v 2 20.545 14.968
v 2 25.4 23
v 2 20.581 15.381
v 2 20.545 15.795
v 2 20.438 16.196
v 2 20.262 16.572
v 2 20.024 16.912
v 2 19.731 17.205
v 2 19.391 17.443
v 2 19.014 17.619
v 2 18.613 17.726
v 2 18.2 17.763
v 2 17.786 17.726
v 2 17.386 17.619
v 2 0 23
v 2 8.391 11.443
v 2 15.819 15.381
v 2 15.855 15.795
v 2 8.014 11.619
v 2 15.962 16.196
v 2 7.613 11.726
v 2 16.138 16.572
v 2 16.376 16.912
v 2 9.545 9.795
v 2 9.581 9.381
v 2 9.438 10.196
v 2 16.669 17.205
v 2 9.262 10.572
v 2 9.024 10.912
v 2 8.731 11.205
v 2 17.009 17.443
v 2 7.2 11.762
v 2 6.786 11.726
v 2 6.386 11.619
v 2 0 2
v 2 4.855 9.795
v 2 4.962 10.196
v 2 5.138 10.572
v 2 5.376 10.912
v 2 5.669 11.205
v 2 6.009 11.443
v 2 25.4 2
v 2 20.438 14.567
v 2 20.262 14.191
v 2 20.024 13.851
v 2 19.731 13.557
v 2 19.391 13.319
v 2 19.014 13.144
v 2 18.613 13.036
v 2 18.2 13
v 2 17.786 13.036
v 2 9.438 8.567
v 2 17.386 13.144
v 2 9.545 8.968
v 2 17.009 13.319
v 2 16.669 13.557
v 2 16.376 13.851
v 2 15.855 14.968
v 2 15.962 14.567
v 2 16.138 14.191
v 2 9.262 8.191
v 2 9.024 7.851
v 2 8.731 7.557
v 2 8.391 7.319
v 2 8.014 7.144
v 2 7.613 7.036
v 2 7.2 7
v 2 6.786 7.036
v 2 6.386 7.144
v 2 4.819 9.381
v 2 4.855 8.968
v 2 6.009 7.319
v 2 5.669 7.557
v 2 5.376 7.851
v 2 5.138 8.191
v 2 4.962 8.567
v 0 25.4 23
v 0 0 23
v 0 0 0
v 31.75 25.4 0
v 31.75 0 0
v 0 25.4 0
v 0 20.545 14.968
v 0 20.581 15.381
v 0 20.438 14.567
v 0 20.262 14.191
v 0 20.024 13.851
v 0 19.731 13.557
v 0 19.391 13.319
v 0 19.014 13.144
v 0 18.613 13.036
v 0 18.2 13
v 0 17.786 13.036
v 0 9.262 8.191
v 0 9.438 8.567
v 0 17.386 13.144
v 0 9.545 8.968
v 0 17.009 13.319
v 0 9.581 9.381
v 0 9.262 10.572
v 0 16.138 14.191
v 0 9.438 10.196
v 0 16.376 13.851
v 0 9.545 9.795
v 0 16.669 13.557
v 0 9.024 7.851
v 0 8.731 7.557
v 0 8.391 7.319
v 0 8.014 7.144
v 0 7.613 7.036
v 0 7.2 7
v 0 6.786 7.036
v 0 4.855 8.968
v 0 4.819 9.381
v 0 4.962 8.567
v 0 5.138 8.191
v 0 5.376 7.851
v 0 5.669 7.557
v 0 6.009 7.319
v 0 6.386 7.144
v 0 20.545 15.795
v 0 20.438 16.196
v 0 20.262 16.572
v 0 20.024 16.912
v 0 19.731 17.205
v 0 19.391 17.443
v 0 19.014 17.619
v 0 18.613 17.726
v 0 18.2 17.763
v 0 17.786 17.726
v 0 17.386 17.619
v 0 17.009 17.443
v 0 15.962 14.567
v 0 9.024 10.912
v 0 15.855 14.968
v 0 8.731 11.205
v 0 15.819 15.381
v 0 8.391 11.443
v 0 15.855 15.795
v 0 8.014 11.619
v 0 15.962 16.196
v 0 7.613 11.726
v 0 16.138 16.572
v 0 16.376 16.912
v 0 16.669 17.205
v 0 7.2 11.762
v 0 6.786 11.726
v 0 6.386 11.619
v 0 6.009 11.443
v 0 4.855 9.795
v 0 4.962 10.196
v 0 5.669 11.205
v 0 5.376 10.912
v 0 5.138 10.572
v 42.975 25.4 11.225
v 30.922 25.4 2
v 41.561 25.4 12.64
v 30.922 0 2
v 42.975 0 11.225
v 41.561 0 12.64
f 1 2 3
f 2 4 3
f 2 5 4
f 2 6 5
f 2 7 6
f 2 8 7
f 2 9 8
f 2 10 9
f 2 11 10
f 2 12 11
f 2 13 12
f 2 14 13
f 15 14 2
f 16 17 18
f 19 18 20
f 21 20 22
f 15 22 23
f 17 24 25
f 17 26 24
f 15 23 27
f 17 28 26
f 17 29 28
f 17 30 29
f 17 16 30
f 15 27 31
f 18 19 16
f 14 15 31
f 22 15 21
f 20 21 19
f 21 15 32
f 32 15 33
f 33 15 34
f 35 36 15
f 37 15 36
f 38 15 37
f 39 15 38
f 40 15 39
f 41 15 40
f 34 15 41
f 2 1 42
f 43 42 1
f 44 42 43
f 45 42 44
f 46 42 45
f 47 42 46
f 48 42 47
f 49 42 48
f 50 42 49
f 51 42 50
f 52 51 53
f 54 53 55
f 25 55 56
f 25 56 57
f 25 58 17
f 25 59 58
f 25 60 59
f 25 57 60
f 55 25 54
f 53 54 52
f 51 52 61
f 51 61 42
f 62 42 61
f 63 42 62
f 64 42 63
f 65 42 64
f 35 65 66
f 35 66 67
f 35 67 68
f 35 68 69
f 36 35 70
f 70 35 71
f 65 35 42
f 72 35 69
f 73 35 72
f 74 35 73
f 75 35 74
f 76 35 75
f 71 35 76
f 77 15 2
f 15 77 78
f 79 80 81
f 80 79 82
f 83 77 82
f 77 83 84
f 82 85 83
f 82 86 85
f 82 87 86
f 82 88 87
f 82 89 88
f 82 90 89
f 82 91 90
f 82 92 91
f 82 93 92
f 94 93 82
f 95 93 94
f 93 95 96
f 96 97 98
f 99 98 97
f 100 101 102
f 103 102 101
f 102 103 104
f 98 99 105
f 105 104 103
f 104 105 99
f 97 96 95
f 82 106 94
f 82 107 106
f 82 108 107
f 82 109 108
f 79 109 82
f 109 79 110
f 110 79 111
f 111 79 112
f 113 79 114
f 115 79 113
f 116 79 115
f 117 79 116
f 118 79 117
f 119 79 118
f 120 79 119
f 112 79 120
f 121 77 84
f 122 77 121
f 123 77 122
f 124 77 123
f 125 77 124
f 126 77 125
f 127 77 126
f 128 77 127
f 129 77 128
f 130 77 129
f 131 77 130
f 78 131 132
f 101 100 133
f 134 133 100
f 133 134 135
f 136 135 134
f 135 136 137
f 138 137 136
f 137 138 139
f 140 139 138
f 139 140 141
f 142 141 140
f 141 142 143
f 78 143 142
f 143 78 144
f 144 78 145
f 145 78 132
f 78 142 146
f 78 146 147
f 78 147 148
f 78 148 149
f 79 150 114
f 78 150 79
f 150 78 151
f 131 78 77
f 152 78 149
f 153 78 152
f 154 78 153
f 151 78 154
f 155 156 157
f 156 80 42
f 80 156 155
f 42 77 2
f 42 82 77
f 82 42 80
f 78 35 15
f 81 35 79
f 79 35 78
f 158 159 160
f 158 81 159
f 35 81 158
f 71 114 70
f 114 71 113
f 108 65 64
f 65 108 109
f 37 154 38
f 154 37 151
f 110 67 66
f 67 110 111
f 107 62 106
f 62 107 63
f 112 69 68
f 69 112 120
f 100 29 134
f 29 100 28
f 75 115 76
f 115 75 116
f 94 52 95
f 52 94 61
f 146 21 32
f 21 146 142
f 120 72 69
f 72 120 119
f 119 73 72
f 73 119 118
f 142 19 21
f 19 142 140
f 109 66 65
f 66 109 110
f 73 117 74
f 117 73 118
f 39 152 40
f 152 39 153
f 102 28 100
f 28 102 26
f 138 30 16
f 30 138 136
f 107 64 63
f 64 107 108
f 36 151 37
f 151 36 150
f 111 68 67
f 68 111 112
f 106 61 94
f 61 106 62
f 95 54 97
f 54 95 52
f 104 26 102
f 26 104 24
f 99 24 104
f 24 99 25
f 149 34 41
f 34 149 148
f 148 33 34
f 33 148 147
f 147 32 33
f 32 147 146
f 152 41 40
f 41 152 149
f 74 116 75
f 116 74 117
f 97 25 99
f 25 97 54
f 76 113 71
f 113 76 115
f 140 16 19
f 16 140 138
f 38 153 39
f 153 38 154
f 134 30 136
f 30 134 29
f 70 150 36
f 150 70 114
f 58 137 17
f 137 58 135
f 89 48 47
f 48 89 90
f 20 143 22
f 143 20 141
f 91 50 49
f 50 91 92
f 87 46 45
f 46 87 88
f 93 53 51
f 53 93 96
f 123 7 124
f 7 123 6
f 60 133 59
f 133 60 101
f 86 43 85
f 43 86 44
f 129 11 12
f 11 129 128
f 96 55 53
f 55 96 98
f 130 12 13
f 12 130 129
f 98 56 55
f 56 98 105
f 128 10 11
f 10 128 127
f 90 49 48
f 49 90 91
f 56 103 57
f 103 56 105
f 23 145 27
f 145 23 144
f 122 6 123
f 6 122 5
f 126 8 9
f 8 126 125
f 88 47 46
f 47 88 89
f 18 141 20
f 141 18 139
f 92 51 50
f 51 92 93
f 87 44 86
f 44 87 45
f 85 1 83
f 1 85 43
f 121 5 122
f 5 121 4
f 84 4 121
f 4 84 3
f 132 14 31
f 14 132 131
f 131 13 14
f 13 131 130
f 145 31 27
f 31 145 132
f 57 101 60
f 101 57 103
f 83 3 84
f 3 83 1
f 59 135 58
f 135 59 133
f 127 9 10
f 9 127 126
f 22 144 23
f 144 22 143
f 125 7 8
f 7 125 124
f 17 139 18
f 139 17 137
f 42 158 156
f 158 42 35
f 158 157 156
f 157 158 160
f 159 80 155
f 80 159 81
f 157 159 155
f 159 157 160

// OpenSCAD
$fn = 36;

walls = 2;
width = 25.4;

botlen = 31.75;

backlen = 23;

frontlen = 15.875;

angle = 45;


// Horizontal separation between holes
hhsep = 11;

// Vertical spacing from base to first hole
vbsep = 5;

// Vertical spacing from first hole to second
vhsep = 6;

hdiam = 4.7625;

// Bottom plate

cube(size = [botlen, width, walls]);

// Front handle

translate([botlen,0,0]){
    rotate([0,-angle,0]) {
        cube(size = [frontlen, width, walls]);
    }
}

// Back plate

difference() {
    cube(size=[walls, width, backlen]);
    
    // Screw holes
    
    translate([walls/2,((width/2)-(hhsep/2)),(hdiam/2)+walls+vbsep]){
  //translate([walls/2,((width/2)-(hhsep/2)),hbsep+(-hdiam/2)]){
        rotate([0,90,0]){
            #cylinder(h=walls*2, d=hdiam, center=true);
        }
    }
    
    translate([walls/2,((width/2)+(hhsep/2)),(hdiam/2)+walls+vbsep+vhsep]){
        rotate([0,90,0]){
            cylinder(h=walls*2, d=hdiam, center=true);
        }
    }
}
